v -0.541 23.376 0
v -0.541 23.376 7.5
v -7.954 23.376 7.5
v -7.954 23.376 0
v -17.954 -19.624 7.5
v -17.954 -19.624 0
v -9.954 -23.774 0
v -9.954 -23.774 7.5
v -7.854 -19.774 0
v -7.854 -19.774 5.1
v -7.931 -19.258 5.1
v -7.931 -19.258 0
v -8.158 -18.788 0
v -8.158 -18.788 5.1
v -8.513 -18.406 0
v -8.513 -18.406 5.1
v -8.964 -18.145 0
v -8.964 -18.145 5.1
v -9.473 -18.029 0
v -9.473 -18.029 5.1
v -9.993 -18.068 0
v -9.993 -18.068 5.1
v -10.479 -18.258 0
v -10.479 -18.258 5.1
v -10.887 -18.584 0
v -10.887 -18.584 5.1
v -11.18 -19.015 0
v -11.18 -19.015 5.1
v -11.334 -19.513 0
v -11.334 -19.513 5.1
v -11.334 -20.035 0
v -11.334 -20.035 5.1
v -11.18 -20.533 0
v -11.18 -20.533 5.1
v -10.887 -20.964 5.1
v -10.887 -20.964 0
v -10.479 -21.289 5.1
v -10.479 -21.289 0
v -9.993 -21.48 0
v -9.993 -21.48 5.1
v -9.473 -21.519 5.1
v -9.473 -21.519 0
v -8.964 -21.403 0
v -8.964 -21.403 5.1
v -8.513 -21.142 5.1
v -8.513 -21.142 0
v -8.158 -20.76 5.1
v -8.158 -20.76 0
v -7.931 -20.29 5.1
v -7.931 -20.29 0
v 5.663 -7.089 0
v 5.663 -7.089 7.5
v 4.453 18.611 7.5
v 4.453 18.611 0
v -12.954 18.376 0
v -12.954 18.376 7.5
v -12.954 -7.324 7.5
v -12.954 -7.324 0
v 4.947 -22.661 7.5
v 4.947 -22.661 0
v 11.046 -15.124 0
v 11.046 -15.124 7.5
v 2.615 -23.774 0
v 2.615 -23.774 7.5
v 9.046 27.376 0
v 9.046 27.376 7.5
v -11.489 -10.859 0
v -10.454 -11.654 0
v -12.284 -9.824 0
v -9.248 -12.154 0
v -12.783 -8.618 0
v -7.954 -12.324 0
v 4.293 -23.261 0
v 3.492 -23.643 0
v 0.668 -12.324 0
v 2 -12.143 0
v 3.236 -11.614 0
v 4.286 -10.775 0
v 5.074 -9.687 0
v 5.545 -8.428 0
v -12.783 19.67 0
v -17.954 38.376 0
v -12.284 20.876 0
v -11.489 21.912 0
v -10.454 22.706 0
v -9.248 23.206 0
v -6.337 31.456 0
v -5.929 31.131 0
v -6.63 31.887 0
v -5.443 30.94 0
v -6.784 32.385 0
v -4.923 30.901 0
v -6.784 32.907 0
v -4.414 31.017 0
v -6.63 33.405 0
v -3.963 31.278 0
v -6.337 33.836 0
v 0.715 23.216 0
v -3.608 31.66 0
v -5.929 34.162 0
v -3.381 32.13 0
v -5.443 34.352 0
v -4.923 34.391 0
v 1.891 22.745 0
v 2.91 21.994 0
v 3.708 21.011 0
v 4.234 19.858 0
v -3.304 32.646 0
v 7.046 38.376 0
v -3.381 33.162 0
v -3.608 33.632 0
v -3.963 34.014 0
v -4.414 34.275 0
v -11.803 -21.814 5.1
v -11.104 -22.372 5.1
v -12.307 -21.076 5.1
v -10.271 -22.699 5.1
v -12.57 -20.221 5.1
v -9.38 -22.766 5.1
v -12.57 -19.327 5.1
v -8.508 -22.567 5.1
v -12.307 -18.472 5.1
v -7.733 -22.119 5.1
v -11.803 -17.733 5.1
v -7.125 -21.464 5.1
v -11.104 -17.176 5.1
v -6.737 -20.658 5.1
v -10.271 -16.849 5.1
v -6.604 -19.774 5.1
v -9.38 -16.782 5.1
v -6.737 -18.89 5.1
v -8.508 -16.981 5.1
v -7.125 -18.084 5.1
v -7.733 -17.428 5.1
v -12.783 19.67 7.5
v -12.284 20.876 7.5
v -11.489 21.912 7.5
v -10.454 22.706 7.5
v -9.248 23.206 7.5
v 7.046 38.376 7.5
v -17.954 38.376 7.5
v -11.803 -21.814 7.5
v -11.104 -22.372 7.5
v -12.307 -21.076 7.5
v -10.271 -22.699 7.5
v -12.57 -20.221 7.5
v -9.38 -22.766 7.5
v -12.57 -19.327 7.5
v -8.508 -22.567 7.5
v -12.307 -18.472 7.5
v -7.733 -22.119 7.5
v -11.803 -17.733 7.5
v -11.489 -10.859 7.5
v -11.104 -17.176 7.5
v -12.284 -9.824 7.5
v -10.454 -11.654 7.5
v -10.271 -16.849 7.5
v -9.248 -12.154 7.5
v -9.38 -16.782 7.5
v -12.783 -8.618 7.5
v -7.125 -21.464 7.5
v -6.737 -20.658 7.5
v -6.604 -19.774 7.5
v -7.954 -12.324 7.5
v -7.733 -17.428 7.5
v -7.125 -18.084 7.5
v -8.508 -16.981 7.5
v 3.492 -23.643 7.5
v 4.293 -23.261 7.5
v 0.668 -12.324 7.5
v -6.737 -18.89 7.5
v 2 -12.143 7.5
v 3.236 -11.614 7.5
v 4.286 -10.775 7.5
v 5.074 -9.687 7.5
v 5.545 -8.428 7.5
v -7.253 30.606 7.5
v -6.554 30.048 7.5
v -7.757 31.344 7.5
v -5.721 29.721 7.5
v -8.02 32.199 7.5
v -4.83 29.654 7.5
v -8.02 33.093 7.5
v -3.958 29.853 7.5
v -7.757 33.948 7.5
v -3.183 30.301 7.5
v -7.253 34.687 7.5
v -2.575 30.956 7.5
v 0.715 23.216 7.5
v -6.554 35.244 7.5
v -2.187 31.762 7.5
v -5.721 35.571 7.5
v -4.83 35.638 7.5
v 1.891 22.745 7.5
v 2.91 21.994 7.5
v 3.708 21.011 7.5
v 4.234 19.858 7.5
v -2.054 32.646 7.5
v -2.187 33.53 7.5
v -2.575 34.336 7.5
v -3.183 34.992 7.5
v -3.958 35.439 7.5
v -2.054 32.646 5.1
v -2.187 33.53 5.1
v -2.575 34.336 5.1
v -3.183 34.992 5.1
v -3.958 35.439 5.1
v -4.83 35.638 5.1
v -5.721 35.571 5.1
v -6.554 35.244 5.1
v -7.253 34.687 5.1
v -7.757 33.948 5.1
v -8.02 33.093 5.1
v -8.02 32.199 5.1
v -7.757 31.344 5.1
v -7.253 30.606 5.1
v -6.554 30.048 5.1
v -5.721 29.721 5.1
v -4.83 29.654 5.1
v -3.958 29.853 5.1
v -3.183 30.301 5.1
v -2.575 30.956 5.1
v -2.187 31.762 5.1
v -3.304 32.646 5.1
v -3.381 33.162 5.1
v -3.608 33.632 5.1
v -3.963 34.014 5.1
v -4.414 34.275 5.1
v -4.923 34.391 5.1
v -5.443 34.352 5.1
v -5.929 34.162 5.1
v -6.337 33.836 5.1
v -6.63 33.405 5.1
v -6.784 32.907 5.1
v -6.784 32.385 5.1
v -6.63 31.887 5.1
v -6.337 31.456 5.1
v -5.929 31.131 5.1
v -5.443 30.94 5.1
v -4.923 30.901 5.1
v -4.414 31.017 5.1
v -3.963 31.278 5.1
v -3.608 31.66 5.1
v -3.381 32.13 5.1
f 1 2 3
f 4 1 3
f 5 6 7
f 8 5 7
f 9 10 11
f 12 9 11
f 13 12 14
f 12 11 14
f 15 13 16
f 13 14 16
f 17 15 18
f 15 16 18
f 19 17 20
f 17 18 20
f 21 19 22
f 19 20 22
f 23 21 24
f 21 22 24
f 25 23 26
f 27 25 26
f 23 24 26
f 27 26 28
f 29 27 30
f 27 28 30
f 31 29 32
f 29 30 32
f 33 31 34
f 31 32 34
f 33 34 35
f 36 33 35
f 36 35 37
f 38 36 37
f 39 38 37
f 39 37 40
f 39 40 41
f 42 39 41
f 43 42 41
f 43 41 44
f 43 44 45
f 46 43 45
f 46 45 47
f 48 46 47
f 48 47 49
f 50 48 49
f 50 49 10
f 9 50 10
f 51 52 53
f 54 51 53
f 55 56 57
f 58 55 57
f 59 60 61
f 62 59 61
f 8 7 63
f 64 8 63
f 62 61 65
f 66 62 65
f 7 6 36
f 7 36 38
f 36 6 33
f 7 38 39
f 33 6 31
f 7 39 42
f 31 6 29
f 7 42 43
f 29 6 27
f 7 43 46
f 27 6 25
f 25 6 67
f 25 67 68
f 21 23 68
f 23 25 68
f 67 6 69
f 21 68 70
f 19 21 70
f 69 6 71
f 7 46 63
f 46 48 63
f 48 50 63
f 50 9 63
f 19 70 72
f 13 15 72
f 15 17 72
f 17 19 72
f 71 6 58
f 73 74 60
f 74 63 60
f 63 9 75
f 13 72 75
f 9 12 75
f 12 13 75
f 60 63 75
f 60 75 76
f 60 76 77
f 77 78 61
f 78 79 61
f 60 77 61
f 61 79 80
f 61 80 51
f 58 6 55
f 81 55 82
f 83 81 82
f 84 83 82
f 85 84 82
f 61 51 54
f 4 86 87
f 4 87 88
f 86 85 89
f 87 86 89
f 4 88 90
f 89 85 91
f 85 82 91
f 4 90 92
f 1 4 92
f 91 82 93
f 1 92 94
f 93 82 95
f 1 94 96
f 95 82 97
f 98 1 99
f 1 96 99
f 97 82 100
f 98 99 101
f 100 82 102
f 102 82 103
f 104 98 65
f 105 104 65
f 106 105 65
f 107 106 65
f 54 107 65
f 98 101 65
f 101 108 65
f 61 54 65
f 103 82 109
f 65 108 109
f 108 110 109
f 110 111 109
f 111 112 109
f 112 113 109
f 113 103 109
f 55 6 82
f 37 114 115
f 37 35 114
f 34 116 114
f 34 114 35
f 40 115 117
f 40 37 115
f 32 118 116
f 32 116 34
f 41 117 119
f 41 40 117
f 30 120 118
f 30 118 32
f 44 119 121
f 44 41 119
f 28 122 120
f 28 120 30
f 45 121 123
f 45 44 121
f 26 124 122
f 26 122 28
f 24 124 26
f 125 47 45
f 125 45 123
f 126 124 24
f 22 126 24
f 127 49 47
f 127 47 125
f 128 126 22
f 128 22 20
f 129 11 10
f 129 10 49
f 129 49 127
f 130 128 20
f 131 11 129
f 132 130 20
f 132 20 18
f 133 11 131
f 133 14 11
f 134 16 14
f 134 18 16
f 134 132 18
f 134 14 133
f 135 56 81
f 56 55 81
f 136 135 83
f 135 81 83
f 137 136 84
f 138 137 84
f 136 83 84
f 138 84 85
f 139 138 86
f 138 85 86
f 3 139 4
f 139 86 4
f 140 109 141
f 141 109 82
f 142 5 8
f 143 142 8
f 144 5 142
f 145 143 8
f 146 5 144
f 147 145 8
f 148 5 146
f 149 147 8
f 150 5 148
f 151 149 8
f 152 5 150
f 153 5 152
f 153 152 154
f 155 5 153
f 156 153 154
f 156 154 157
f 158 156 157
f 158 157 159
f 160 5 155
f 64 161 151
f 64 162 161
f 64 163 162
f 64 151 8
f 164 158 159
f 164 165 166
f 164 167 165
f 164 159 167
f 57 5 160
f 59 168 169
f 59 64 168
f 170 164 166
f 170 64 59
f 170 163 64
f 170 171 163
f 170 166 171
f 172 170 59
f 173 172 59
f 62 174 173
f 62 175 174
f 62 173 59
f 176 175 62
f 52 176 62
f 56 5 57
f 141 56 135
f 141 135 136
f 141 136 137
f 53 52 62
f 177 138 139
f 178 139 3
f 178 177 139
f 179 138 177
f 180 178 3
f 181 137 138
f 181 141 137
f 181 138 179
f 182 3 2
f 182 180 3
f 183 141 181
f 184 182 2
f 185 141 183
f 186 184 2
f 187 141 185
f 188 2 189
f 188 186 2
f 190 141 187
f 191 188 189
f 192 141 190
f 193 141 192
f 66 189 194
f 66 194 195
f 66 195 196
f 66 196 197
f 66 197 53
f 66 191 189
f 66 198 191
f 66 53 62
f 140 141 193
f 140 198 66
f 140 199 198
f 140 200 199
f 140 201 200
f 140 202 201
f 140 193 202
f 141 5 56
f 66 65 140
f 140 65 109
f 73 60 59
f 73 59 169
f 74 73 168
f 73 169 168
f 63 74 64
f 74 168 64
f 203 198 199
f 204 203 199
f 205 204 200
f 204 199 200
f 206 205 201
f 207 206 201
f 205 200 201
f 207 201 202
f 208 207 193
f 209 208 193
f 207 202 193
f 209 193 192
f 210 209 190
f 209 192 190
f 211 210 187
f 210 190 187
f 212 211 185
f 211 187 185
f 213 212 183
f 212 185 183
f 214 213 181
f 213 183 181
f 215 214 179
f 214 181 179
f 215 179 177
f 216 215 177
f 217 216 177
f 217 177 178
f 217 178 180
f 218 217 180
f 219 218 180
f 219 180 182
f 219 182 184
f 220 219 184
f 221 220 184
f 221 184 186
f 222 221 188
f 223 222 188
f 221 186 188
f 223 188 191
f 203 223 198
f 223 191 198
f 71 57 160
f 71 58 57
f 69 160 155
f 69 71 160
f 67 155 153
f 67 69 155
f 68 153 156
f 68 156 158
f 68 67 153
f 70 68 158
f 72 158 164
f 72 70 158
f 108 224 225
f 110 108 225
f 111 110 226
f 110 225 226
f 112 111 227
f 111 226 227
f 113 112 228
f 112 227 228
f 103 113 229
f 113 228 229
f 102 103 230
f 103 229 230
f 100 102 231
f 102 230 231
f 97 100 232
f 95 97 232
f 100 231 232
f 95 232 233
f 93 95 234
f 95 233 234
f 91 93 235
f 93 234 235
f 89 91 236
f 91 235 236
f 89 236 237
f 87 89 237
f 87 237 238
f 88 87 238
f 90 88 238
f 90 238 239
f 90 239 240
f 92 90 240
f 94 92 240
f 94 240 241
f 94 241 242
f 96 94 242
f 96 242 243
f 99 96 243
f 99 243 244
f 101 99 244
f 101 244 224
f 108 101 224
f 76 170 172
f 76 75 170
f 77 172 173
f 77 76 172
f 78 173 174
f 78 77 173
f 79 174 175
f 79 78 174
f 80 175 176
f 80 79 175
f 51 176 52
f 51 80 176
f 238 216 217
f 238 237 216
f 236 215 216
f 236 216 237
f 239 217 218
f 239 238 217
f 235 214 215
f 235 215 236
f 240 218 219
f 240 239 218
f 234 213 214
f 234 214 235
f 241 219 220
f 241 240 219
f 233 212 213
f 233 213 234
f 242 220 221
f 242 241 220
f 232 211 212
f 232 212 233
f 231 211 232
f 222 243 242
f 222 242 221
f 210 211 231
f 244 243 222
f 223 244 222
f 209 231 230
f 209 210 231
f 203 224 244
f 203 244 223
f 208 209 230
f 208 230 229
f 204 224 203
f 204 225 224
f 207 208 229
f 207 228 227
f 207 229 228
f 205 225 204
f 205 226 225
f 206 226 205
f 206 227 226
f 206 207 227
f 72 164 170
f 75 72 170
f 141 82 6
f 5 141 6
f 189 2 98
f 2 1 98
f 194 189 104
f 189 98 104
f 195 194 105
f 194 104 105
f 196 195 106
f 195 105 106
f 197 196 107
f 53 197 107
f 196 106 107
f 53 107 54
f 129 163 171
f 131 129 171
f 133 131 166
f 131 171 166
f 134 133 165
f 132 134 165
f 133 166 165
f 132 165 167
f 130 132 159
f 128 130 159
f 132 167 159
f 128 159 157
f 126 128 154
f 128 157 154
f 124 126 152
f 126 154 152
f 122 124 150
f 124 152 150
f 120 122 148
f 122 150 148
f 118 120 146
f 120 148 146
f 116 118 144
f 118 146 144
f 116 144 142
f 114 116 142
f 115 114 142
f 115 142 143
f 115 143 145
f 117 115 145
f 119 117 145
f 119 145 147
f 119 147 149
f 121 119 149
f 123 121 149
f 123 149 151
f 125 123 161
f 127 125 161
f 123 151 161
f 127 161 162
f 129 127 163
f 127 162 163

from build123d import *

# Parameters (mm, degrees)
F1_DEPTH = 7.5
F3_DEPTH = 7.5
F4_R     = 1.75
F5_DEPTH = 7.5
F6_R     = 3
F7_DEPTH = 2.4
F8_R     = 3
F9_R     = 5
F10_R    = 5
F11_R    = 5
F12_R    = 5


with BuildPart() as f1:
    # F0 (on Top) → F1 (new body)
    with BuildSketch(Plane.XY):
        Polygon((7.046259, 38.376067), (-17.953741, 38.376067), (-17.953741, -19.623933), (-9.953741, -23.773933), (4.046259, -23.773933), (11.046259, -15.123933), (9.046259, 27.376067), align=None)
    extrude(amount=F1_DEPTH)

    # F2 (on face) → F3 (cut, through all)
    with BuildSketch(Plane.XY.offset(7.5)):
        Polygon((4.228961, 23.376067), (-12.953741, 23.376067), (-12.953741, -12.323933), (5.908961, -12.323933), align=None)
    extrude(amount=-F3_DEPTH, mode=Mode.SUBTRACT)

    # F4 (on face) → F5 (cut, through all)
    with BuildSketch(Plane.XY.offset(7.5)):
        with Locations((-5.053741, 32.646067)):
            Circle(F4_R)
        with Locations((-9.603741, -19.773933)):
            Circle(F4_R)
    extrude(amount=-F5_DEPTH, mode=Mode.SUBTRACT)

    # F6 (on face) → F7 (cut)
    with BuildSketch(Plane.XY.offset(7.5)):
        with Locations((-5.053741, 32.646067)):
            Circle(F6_R)
        with Locations((-9.603741, -19.773933)):
            Circle(F6_R)
    extrude(amount=-F7_DEPTH, mode=Mode.SUBTRACT)

    # F8
    f8_edges = [f1.edges().sort_by_distance(p)[0] for p in [
        (4.046259, -23.773933, 3.75),
    ]]
    fillet(f8_edges, radius=F8_R)

    # F9
    f9_edges = [f1.edges().sort_by_distance(p)[0] for p in [
        (-12.953741, -12.323933, 3.75),
    ]]
    fillet(f9_edges, radius=F9_R)

    # F10
    f10_edges = [f1.edges().sort_by_distance(p)[0] for p in [
        (5.908961, -12.323933, 3.75),
    ]]
    fillet(f10_edges, radius=F10_R)

    # F11
    f11_edges = [f1.edges().sort_by_distance(p)[0] for p in [
        (-12.953741, 23.376067, 3.75),
    ]]
    fillet(f11_edges, radius=F11_R)

    # F12
    f12_edges = [f1.edges().sort_by_distance(p)[0] for p in [
        (4.228961, 23.376067, 3.75),
    ]]
    fillet(f12_edges, radius=F12_R)


solid = f1.part
